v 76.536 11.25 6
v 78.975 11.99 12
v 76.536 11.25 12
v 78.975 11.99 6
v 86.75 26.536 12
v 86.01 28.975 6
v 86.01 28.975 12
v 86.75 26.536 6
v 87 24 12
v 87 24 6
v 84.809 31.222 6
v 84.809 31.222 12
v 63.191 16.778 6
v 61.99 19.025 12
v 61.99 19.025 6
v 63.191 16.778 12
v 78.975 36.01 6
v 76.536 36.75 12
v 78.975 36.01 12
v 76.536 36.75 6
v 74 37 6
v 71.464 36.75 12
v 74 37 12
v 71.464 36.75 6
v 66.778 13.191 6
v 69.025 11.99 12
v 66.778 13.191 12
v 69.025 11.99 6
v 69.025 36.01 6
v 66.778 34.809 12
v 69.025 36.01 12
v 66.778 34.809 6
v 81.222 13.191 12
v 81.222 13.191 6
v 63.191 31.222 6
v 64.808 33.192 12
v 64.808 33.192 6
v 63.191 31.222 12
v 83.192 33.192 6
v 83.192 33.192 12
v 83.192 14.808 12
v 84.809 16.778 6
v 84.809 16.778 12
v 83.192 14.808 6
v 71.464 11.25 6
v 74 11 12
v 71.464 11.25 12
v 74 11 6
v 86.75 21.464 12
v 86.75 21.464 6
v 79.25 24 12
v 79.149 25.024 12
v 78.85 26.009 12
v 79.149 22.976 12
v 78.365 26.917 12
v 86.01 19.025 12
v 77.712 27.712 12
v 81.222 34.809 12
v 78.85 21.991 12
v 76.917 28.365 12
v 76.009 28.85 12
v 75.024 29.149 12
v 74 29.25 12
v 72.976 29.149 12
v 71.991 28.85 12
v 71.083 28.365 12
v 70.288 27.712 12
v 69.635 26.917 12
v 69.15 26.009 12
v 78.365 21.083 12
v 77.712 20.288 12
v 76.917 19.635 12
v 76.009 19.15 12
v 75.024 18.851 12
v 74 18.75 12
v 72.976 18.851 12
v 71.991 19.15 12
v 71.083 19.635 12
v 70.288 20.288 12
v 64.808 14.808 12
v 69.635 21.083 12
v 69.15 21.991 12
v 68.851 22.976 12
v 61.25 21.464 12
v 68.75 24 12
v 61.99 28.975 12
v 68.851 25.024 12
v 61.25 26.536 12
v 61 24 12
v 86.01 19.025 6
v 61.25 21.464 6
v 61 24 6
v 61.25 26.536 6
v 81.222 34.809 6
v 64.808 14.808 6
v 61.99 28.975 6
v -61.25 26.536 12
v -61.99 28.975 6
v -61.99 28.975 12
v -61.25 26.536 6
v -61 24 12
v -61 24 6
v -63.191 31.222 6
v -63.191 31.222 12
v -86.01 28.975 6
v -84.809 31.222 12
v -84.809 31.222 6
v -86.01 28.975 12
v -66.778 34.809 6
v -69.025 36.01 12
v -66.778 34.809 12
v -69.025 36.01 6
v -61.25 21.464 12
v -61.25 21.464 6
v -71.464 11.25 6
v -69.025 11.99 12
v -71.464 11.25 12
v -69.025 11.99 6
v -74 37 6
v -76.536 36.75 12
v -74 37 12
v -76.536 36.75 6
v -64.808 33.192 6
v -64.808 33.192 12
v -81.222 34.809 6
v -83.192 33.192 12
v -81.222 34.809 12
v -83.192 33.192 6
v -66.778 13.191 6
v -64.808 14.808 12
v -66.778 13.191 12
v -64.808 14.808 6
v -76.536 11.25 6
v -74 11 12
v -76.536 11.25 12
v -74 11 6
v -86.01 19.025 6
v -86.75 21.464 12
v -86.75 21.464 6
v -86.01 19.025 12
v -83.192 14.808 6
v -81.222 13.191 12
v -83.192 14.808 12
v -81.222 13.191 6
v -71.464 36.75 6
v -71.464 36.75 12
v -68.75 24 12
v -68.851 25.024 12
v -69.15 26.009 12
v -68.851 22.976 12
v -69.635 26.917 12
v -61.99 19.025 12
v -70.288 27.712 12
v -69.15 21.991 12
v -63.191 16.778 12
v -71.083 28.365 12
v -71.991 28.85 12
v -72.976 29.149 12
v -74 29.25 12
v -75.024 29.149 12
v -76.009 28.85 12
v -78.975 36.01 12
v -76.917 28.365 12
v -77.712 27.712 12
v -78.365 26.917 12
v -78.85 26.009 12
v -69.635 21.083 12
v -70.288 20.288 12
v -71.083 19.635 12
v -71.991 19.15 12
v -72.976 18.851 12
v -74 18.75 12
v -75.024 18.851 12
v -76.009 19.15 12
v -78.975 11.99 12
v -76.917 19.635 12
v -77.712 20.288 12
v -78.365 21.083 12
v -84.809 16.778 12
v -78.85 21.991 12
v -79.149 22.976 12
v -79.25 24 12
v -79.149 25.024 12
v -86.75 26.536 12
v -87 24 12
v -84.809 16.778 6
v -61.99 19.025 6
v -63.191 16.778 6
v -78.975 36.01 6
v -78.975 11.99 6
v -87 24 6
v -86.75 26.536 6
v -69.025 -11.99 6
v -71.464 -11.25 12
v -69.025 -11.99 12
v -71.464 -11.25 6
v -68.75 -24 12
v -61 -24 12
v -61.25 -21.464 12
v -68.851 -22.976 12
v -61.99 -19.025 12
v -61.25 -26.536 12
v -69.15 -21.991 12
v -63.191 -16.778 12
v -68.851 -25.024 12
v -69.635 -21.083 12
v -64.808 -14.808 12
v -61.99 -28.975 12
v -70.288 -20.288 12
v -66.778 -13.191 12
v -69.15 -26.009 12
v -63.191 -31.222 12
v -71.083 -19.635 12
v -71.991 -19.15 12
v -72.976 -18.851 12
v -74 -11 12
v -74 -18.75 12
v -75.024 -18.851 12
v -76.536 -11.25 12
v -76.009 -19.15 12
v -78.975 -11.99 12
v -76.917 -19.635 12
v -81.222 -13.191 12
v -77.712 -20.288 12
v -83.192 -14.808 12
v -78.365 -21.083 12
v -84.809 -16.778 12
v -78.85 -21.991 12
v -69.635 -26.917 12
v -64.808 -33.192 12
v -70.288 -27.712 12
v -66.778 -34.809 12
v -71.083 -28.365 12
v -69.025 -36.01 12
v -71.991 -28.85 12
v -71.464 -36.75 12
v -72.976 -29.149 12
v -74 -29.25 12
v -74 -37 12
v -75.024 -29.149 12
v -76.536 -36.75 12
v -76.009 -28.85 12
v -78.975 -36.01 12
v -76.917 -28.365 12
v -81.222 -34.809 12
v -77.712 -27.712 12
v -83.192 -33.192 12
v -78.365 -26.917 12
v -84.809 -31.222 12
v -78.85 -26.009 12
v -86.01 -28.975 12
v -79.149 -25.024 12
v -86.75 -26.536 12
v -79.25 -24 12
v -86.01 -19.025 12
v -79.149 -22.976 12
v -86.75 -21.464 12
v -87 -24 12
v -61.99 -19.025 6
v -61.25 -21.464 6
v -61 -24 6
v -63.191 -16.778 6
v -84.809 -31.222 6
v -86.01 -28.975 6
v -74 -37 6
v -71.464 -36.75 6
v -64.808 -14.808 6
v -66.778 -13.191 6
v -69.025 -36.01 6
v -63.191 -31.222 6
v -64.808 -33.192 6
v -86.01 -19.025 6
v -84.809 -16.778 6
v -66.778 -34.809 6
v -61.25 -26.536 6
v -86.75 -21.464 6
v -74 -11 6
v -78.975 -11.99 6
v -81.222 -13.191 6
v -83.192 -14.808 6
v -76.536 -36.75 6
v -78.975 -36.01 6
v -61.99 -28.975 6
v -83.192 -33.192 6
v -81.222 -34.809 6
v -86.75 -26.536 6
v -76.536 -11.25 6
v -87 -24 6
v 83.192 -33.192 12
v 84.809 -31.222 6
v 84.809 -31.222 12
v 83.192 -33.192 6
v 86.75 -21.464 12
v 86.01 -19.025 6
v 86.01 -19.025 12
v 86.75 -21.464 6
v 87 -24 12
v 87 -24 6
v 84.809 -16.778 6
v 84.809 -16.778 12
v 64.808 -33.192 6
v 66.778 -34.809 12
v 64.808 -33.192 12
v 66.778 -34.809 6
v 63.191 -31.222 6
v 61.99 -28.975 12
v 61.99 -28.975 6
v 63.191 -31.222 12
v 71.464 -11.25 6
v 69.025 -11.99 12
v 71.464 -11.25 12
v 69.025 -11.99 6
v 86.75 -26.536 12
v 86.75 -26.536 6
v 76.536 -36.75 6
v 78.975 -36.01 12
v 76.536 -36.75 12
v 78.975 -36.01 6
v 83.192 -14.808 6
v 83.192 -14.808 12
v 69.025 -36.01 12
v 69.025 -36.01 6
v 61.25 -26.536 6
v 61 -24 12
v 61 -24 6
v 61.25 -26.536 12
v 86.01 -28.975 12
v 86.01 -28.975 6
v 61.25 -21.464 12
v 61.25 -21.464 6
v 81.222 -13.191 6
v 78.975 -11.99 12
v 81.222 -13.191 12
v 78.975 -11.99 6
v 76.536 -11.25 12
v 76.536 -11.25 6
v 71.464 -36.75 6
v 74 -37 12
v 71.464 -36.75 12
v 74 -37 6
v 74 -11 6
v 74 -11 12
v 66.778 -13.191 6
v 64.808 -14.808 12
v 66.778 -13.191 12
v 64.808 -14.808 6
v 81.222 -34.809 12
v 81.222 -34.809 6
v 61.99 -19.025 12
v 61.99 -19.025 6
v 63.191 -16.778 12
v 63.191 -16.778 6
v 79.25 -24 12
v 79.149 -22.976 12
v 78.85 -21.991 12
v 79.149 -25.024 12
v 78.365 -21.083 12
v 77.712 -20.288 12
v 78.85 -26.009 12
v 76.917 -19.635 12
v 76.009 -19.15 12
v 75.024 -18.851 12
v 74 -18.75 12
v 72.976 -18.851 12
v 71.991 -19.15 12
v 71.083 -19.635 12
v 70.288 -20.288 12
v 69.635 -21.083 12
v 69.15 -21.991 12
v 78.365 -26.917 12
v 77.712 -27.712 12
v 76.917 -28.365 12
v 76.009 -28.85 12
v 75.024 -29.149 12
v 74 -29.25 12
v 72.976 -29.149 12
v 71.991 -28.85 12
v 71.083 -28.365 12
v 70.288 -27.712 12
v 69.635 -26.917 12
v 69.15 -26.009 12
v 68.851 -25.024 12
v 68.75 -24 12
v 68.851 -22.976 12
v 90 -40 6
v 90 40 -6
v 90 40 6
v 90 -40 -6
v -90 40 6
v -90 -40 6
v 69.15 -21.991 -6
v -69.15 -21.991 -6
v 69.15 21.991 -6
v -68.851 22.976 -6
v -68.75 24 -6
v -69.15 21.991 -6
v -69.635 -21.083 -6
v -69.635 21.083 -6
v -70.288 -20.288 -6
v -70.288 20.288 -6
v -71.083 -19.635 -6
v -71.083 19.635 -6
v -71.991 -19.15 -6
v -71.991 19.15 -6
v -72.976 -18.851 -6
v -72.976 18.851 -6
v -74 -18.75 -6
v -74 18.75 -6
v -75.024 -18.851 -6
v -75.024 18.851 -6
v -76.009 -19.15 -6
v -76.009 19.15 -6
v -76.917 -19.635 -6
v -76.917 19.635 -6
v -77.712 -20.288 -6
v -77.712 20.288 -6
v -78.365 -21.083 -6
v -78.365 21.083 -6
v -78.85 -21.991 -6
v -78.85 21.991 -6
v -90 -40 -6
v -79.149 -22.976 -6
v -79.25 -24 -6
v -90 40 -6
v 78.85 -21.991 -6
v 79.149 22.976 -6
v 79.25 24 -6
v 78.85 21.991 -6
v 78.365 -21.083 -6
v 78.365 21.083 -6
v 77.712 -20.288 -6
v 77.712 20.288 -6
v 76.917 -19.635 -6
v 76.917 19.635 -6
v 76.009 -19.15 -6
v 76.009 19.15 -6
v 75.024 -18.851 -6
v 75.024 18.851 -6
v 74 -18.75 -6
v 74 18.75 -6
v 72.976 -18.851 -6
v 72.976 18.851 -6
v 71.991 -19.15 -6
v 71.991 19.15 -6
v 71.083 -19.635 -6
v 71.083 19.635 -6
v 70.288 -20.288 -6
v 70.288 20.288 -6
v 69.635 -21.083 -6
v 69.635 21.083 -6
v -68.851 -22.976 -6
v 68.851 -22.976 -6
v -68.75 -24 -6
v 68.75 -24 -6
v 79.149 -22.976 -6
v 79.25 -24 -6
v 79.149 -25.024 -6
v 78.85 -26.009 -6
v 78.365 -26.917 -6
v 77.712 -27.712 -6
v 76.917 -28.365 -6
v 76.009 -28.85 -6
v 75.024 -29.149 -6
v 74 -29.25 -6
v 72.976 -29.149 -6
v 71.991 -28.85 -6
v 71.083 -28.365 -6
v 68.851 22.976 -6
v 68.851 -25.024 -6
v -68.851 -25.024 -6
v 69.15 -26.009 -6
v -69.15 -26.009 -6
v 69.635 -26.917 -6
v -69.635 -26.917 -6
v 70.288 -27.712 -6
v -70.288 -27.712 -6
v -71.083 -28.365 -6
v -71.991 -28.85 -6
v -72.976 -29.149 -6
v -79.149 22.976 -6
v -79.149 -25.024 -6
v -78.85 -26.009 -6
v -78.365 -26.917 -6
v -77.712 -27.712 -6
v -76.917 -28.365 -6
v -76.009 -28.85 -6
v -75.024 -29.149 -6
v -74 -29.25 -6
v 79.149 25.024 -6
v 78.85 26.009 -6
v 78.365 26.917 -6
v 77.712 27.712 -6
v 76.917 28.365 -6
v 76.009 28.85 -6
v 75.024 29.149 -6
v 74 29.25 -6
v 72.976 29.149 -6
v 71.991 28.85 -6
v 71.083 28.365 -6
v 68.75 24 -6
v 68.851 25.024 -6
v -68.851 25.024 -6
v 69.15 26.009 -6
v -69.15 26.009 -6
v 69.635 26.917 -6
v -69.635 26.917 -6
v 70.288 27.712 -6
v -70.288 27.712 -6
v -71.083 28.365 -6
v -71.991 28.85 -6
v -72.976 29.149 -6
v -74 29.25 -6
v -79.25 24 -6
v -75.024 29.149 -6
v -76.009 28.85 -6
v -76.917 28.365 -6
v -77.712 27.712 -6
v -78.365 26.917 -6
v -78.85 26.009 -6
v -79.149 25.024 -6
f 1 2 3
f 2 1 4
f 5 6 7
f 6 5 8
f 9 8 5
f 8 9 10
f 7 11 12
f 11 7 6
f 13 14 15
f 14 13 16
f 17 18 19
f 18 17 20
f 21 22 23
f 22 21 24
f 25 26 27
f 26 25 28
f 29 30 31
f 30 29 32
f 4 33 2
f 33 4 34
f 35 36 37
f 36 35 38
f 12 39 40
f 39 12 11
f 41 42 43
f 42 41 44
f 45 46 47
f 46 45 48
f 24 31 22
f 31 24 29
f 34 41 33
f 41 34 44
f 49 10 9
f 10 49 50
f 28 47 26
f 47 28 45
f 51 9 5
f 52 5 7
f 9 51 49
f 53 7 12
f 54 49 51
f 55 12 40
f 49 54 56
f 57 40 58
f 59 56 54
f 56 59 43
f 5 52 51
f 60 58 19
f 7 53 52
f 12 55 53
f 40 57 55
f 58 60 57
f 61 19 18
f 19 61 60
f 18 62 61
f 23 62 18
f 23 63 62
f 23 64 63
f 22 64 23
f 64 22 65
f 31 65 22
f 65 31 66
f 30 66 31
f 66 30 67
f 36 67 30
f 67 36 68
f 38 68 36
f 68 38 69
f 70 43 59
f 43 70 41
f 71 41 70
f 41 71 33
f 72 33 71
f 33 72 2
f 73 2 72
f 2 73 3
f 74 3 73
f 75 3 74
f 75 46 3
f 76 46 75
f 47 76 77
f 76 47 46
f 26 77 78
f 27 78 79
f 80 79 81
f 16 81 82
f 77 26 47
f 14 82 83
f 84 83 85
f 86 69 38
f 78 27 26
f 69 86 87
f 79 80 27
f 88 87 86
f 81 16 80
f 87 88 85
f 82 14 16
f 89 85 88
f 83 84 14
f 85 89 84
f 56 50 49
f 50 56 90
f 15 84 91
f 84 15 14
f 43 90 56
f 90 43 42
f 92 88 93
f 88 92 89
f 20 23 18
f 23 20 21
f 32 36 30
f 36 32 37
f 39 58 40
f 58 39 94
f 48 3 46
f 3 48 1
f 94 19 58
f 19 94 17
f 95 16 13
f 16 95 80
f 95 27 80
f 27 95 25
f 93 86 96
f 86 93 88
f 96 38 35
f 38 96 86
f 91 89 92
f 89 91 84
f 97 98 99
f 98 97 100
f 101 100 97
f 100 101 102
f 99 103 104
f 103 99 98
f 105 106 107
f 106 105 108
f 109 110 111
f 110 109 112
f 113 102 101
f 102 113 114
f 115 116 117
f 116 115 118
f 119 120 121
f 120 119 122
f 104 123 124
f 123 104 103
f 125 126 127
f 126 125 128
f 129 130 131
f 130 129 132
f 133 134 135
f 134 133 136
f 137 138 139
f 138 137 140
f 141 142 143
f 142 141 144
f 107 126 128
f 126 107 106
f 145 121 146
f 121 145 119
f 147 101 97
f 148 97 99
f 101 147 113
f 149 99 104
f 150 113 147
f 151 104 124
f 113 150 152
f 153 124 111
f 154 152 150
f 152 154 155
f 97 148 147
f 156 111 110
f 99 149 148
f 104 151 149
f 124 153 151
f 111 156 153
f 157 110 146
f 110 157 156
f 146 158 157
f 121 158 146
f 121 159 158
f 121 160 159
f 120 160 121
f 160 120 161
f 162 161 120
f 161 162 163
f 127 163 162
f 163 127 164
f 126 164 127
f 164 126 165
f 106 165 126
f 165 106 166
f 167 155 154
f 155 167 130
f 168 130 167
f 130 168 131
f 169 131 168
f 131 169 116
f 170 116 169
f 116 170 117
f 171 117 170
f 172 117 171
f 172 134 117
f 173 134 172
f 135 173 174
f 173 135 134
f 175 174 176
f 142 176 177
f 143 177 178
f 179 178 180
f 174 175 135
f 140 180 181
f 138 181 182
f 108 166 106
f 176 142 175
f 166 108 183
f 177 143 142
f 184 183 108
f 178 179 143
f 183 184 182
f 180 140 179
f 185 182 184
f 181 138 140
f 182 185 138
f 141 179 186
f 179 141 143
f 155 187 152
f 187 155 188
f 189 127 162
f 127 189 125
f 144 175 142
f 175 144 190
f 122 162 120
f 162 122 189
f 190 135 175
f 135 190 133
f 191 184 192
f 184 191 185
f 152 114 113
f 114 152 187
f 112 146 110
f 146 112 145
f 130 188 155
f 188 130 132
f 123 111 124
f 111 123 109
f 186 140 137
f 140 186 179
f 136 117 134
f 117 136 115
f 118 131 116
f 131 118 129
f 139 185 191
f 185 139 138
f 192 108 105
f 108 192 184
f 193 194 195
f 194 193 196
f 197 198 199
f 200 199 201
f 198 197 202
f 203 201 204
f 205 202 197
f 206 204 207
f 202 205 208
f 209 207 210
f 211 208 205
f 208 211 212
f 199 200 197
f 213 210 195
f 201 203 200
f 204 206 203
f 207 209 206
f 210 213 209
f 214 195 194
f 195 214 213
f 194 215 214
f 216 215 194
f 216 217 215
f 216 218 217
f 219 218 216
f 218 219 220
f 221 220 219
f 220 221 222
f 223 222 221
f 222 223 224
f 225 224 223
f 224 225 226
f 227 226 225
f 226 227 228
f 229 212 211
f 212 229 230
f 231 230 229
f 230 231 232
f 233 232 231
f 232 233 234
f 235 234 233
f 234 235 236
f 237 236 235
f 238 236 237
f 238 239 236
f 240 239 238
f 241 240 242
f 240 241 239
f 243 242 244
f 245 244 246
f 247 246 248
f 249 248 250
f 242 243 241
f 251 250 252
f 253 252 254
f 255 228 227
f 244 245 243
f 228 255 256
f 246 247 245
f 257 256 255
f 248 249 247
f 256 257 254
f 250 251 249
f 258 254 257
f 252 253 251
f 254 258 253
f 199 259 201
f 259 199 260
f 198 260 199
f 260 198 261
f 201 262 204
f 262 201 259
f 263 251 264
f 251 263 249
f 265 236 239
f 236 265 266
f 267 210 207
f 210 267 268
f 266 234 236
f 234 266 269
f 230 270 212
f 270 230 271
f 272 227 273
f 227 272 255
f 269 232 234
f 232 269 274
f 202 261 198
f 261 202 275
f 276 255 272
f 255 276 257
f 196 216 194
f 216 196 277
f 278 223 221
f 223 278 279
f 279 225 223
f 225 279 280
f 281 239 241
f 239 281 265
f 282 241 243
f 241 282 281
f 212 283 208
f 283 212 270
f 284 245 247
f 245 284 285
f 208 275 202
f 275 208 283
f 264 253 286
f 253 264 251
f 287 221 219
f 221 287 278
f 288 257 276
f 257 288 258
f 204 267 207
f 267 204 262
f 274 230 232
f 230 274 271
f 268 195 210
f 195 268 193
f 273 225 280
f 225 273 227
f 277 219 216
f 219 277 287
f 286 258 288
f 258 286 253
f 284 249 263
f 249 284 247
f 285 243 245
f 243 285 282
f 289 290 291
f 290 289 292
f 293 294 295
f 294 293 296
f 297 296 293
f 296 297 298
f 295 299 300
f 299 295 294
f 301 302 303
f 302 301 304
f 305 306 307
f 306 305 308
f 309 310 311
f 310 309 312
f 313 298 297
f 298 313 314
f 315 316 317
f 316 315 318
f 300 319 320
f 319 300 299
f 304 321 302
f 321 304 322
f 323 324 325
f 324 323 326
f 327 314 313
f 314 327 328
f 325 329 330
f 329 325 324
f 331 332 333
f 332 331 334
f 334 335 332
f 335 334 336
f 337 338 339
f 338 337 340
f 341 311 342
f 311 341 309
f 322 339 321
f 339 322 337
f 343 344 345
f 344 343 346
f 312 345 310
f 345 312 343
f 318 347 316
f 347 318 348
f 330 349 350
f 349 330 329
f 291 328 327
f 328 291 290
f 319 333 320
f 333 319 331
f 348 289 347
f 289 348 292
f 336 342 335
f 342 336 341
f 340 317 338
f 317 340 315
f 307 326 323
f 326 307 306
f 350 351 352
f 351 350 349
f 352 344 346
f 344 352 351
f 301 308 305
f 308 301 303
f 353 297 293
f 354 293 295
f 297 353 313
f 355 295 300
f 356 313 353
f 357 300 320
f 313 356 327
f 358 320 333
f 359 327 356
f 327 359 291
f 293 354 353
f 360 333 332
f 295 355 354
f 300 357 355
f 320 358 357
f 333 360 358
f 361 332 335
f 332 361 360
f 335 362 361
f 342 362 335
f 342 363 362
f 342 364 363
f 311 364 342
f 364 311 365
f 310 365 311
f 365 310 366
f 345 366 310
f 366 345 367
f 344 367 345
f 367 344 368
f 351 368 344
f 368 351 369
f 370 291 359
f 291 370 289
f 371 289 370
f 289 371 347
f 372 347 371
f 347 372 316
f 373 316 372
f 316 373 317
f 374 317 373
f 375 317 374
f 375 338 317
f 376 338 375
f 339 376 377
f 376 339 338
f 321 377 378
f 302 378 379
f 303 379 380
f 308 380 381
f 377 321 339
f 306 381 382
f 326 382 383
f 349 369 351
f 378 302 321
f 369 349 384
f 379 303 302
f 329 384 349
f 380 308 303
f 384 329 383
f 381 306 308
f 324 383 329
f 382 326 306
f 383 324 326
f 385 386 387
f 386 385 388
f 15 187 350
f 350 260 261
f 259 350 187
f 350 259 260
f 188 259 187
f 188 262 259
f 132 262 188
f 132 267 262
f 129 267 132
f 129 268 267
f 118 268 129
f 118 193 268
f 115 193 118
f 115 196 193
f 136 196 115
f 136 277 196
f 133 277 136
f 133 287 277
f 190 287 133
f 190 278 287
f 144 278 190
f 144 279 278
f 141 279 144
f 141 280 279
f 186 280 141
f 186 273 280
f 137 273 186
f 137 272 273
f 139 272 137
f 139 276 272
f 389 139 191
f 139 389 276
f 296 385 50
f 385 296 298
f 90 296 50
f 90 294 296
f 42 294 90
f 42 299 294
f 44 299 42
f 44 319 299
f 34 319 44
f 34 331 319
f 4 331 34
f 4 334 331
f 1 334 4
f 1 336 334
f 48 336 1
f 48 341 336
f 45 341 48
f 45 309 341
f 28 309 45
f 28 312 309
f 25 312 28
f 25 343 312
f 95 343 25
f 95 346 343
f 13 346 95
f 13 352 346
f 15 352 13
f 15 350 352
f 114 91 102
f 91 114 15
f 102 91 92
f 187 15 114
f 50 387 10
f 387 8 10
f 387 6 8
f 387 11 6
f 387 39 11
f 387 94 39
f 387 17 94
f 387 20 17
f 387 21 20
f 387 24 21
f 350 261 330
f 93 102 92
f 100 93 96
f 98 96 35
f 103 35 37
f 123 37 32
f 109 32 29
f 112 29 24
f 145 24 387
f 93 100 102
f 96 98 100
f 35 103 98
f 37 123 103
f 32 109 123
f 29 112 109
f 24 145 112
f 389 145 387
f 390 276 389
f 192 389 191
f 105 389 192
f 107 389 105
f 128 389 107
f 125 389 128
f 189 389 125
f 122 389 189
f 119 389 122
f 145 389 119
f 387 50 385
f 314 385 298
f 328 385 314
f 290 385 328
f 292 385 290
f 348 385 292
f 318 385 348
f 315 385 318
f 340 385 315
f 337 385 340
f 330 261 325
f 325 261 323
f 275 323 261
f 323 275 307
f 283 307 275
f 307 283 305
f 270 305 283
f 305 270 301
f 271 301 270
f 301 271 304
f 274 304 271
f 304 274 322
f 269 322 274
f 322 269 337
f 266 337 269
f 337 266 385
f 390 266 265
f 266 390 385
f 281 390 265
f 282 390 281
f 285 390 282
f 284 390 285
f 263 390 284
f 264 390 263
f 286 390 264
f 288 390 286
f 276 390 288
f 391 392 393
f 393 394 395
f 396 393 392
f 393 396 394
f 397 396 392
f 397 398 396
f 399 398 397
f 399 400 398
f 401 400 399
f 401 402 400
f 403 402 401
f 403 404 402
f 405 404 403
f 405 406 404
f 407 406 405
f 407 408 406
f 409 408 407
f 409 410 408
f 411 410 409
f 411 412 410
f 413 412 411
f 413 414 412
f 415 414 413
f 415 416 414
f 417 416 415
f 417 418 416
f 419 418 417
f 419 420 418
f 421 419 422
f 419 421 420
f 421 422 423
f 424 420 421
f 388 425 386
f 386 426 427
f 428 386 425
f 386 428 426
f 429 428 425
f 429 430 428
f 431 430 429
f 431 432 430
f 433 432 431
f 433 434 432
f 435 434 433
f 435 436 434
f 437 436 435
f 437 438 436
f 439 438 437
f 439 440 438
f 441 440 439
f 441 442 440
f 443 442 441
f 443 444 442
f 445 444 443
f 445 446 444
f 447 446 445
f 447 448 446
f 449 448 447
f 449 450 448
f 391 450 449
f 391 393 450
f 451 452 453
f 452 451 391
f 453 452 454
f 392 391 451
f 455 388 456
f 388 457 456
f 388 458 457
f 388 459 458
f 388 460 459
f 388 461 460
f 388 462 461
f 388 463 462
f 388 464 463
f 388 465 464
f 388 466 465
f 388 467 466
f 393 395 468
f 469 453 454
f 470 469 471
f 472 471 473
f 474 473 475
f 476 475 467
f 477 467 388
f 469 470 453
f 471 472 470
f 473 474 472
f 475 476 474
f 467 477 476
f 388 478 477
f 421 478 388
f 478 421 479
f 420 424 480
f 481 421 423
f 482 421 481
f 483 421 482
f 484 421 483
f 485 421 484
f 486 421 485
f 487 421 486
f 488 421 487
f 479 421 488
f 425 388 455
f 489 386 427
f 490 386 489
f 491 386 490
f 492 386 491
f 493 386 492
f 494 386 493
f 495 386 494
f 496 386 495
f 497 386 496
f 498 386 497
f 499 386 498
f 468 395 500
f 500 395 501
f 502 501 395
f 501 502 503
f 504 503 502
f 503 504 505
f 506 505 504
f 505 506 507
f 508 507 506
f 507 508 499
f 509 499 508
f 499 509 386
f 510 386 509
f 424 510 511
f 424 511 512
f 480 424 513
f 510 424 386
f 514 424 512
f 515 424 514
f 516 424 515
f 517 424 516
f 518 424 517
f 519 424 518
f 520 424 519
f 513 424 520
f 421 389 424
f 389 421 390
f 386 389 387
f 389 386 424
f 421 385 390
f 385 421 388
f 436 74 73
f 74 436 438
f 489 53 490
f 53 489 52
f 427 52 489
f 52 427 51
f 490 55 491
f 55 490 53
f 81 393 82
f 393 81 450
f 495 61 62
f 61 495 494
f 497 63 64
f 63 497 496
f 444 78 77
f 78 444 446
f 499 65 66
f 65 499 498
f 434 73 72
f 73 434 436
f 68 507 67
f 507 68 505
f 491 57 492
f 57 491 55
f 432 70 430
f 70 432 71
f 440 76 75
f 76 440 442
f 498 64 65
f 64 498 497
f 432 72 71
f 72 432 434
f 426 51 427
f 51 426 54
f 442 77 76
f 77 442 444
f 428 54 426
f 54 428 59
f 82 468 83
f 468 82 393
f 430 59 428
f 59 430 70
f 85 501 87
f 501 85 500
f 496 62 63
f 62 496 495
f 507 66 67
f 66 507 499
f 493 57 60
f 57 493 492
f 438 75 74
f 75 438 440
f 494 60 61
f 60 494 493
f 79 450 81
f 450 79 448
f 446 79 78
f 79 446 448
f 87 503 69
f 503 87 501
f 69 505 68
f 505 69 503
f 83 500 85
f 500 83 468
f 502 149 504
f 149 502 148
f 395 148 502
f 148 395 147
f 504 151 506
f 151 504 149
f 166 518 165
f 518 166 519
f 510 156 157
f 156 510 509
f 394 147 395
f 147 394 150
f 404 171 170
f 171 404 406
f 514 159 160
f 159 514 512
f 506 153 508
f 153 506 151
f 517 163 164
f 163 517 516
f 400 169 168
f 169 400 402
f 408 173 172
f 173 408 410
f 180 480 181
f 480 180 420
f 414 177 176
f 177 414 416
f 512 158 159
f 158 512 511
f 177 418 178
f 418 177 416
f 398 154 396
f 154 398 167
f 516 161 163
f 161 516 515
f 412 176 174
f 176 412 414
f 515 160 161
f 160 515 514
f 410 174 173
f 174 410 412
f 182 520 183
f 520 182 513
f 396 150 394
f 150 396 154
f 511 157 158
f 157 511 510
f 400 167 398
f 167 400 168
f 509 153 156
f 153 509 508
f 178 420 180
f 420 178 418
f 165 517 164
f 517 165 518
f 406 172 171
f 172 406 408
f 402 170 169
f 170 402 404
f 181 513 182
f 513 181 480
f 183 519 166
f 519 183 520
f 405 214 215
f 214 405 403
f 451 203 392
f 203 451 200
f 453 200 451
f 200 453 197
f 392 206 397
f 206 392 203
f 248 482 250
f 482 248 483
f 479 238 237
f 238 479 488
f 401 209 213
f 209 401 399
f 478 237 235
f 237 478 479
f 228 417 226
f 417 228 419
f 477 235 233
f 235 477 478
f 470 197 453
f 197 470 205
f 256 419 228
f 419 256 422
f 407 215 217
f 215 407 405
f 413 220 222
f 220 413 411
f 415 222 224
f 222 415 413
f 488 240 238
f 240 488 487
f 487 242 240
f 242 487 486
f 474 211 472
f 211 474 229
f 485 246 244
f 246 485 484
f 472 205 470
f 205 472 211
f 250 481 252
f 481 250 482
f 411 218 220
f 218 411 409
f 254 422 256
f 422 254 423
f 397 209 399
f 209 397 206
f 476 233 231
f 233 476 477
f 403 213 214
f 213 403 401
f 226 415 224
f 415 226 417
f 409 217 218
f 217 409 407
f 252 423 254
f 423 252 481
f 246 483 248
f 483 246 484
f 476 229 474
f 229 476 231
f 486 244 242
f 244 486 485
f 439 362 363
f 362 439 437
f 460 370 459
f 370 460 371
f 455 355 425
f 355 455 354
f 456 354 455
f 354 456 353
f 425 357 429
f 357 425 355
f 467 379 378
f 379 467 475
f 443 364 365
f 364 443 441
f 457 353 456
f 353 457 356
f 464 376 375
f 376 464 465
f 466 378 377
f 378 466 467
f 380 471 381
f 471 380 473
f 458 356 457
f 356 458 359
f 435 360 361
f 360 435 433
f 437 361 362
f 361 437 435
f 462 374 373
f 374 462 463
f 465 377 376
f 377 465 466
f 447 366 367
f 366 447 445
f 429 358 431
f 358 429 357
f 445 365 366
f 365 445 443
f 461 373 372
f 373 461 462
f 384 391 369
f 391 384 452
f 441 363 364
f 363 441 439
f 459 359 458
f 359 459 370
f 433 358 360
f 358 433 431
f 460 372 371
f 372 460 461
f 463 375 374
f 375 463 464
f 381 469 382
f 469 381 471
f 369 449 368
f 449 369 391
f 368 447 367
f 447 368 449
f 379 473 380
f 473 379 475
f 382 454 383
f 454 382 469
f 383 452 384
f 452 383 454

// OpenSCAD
$fn = 32;

// ----------------------------------------------------------------------
// Anchor pads 180 x 80 x 18
// four corner bosses with anchor holes
// ----------------------------------------------------------------------

// --- parameters (mm) ---
plate = [180, 80, 12];  // base plate size (x, y, z)
pads = 4;               // boss count, one per corner
edge = 16;              // boss centre offset from the plate edge
boss_d = 26;            // boss diameter
boss_h = 6;             // boss height above the base plate
hole_d = 10.5;          // hole diameter

// --- derived feature positions (mm) ---
height = plate[2] + boss_h;      // = 18   overall height of the part
corner_x = plate[0] / 2 - edge;  // = 74   boss centre X
corner_y = plate[1] / 2 - edge;  // = 24   boss centre Y
feature_centers = [
  [corner_x, corner_y],
  [-corner_x, corner_y],
  [-corner_x, -corner_y],
  [corner_x, -corner_y]
];   // boss centres, anchor holes are drilled there

// base plate, four bosses standing on it, anchor holes all the way through
difference() {
  union() {
    cube(plate, center = true);
    for (centre = feature_centers)
      translate([centre[0], centre[1], plate[2] / 2 - 1])
        cylinder(d = boss_d, h = boss_h + 1);
  }
  for (centre = feature_centers)
    translate([centre[0], centre[1], -height])
      cylinder(d = hole_d, h = 2 * height + 2);  // through boss and plate
}
